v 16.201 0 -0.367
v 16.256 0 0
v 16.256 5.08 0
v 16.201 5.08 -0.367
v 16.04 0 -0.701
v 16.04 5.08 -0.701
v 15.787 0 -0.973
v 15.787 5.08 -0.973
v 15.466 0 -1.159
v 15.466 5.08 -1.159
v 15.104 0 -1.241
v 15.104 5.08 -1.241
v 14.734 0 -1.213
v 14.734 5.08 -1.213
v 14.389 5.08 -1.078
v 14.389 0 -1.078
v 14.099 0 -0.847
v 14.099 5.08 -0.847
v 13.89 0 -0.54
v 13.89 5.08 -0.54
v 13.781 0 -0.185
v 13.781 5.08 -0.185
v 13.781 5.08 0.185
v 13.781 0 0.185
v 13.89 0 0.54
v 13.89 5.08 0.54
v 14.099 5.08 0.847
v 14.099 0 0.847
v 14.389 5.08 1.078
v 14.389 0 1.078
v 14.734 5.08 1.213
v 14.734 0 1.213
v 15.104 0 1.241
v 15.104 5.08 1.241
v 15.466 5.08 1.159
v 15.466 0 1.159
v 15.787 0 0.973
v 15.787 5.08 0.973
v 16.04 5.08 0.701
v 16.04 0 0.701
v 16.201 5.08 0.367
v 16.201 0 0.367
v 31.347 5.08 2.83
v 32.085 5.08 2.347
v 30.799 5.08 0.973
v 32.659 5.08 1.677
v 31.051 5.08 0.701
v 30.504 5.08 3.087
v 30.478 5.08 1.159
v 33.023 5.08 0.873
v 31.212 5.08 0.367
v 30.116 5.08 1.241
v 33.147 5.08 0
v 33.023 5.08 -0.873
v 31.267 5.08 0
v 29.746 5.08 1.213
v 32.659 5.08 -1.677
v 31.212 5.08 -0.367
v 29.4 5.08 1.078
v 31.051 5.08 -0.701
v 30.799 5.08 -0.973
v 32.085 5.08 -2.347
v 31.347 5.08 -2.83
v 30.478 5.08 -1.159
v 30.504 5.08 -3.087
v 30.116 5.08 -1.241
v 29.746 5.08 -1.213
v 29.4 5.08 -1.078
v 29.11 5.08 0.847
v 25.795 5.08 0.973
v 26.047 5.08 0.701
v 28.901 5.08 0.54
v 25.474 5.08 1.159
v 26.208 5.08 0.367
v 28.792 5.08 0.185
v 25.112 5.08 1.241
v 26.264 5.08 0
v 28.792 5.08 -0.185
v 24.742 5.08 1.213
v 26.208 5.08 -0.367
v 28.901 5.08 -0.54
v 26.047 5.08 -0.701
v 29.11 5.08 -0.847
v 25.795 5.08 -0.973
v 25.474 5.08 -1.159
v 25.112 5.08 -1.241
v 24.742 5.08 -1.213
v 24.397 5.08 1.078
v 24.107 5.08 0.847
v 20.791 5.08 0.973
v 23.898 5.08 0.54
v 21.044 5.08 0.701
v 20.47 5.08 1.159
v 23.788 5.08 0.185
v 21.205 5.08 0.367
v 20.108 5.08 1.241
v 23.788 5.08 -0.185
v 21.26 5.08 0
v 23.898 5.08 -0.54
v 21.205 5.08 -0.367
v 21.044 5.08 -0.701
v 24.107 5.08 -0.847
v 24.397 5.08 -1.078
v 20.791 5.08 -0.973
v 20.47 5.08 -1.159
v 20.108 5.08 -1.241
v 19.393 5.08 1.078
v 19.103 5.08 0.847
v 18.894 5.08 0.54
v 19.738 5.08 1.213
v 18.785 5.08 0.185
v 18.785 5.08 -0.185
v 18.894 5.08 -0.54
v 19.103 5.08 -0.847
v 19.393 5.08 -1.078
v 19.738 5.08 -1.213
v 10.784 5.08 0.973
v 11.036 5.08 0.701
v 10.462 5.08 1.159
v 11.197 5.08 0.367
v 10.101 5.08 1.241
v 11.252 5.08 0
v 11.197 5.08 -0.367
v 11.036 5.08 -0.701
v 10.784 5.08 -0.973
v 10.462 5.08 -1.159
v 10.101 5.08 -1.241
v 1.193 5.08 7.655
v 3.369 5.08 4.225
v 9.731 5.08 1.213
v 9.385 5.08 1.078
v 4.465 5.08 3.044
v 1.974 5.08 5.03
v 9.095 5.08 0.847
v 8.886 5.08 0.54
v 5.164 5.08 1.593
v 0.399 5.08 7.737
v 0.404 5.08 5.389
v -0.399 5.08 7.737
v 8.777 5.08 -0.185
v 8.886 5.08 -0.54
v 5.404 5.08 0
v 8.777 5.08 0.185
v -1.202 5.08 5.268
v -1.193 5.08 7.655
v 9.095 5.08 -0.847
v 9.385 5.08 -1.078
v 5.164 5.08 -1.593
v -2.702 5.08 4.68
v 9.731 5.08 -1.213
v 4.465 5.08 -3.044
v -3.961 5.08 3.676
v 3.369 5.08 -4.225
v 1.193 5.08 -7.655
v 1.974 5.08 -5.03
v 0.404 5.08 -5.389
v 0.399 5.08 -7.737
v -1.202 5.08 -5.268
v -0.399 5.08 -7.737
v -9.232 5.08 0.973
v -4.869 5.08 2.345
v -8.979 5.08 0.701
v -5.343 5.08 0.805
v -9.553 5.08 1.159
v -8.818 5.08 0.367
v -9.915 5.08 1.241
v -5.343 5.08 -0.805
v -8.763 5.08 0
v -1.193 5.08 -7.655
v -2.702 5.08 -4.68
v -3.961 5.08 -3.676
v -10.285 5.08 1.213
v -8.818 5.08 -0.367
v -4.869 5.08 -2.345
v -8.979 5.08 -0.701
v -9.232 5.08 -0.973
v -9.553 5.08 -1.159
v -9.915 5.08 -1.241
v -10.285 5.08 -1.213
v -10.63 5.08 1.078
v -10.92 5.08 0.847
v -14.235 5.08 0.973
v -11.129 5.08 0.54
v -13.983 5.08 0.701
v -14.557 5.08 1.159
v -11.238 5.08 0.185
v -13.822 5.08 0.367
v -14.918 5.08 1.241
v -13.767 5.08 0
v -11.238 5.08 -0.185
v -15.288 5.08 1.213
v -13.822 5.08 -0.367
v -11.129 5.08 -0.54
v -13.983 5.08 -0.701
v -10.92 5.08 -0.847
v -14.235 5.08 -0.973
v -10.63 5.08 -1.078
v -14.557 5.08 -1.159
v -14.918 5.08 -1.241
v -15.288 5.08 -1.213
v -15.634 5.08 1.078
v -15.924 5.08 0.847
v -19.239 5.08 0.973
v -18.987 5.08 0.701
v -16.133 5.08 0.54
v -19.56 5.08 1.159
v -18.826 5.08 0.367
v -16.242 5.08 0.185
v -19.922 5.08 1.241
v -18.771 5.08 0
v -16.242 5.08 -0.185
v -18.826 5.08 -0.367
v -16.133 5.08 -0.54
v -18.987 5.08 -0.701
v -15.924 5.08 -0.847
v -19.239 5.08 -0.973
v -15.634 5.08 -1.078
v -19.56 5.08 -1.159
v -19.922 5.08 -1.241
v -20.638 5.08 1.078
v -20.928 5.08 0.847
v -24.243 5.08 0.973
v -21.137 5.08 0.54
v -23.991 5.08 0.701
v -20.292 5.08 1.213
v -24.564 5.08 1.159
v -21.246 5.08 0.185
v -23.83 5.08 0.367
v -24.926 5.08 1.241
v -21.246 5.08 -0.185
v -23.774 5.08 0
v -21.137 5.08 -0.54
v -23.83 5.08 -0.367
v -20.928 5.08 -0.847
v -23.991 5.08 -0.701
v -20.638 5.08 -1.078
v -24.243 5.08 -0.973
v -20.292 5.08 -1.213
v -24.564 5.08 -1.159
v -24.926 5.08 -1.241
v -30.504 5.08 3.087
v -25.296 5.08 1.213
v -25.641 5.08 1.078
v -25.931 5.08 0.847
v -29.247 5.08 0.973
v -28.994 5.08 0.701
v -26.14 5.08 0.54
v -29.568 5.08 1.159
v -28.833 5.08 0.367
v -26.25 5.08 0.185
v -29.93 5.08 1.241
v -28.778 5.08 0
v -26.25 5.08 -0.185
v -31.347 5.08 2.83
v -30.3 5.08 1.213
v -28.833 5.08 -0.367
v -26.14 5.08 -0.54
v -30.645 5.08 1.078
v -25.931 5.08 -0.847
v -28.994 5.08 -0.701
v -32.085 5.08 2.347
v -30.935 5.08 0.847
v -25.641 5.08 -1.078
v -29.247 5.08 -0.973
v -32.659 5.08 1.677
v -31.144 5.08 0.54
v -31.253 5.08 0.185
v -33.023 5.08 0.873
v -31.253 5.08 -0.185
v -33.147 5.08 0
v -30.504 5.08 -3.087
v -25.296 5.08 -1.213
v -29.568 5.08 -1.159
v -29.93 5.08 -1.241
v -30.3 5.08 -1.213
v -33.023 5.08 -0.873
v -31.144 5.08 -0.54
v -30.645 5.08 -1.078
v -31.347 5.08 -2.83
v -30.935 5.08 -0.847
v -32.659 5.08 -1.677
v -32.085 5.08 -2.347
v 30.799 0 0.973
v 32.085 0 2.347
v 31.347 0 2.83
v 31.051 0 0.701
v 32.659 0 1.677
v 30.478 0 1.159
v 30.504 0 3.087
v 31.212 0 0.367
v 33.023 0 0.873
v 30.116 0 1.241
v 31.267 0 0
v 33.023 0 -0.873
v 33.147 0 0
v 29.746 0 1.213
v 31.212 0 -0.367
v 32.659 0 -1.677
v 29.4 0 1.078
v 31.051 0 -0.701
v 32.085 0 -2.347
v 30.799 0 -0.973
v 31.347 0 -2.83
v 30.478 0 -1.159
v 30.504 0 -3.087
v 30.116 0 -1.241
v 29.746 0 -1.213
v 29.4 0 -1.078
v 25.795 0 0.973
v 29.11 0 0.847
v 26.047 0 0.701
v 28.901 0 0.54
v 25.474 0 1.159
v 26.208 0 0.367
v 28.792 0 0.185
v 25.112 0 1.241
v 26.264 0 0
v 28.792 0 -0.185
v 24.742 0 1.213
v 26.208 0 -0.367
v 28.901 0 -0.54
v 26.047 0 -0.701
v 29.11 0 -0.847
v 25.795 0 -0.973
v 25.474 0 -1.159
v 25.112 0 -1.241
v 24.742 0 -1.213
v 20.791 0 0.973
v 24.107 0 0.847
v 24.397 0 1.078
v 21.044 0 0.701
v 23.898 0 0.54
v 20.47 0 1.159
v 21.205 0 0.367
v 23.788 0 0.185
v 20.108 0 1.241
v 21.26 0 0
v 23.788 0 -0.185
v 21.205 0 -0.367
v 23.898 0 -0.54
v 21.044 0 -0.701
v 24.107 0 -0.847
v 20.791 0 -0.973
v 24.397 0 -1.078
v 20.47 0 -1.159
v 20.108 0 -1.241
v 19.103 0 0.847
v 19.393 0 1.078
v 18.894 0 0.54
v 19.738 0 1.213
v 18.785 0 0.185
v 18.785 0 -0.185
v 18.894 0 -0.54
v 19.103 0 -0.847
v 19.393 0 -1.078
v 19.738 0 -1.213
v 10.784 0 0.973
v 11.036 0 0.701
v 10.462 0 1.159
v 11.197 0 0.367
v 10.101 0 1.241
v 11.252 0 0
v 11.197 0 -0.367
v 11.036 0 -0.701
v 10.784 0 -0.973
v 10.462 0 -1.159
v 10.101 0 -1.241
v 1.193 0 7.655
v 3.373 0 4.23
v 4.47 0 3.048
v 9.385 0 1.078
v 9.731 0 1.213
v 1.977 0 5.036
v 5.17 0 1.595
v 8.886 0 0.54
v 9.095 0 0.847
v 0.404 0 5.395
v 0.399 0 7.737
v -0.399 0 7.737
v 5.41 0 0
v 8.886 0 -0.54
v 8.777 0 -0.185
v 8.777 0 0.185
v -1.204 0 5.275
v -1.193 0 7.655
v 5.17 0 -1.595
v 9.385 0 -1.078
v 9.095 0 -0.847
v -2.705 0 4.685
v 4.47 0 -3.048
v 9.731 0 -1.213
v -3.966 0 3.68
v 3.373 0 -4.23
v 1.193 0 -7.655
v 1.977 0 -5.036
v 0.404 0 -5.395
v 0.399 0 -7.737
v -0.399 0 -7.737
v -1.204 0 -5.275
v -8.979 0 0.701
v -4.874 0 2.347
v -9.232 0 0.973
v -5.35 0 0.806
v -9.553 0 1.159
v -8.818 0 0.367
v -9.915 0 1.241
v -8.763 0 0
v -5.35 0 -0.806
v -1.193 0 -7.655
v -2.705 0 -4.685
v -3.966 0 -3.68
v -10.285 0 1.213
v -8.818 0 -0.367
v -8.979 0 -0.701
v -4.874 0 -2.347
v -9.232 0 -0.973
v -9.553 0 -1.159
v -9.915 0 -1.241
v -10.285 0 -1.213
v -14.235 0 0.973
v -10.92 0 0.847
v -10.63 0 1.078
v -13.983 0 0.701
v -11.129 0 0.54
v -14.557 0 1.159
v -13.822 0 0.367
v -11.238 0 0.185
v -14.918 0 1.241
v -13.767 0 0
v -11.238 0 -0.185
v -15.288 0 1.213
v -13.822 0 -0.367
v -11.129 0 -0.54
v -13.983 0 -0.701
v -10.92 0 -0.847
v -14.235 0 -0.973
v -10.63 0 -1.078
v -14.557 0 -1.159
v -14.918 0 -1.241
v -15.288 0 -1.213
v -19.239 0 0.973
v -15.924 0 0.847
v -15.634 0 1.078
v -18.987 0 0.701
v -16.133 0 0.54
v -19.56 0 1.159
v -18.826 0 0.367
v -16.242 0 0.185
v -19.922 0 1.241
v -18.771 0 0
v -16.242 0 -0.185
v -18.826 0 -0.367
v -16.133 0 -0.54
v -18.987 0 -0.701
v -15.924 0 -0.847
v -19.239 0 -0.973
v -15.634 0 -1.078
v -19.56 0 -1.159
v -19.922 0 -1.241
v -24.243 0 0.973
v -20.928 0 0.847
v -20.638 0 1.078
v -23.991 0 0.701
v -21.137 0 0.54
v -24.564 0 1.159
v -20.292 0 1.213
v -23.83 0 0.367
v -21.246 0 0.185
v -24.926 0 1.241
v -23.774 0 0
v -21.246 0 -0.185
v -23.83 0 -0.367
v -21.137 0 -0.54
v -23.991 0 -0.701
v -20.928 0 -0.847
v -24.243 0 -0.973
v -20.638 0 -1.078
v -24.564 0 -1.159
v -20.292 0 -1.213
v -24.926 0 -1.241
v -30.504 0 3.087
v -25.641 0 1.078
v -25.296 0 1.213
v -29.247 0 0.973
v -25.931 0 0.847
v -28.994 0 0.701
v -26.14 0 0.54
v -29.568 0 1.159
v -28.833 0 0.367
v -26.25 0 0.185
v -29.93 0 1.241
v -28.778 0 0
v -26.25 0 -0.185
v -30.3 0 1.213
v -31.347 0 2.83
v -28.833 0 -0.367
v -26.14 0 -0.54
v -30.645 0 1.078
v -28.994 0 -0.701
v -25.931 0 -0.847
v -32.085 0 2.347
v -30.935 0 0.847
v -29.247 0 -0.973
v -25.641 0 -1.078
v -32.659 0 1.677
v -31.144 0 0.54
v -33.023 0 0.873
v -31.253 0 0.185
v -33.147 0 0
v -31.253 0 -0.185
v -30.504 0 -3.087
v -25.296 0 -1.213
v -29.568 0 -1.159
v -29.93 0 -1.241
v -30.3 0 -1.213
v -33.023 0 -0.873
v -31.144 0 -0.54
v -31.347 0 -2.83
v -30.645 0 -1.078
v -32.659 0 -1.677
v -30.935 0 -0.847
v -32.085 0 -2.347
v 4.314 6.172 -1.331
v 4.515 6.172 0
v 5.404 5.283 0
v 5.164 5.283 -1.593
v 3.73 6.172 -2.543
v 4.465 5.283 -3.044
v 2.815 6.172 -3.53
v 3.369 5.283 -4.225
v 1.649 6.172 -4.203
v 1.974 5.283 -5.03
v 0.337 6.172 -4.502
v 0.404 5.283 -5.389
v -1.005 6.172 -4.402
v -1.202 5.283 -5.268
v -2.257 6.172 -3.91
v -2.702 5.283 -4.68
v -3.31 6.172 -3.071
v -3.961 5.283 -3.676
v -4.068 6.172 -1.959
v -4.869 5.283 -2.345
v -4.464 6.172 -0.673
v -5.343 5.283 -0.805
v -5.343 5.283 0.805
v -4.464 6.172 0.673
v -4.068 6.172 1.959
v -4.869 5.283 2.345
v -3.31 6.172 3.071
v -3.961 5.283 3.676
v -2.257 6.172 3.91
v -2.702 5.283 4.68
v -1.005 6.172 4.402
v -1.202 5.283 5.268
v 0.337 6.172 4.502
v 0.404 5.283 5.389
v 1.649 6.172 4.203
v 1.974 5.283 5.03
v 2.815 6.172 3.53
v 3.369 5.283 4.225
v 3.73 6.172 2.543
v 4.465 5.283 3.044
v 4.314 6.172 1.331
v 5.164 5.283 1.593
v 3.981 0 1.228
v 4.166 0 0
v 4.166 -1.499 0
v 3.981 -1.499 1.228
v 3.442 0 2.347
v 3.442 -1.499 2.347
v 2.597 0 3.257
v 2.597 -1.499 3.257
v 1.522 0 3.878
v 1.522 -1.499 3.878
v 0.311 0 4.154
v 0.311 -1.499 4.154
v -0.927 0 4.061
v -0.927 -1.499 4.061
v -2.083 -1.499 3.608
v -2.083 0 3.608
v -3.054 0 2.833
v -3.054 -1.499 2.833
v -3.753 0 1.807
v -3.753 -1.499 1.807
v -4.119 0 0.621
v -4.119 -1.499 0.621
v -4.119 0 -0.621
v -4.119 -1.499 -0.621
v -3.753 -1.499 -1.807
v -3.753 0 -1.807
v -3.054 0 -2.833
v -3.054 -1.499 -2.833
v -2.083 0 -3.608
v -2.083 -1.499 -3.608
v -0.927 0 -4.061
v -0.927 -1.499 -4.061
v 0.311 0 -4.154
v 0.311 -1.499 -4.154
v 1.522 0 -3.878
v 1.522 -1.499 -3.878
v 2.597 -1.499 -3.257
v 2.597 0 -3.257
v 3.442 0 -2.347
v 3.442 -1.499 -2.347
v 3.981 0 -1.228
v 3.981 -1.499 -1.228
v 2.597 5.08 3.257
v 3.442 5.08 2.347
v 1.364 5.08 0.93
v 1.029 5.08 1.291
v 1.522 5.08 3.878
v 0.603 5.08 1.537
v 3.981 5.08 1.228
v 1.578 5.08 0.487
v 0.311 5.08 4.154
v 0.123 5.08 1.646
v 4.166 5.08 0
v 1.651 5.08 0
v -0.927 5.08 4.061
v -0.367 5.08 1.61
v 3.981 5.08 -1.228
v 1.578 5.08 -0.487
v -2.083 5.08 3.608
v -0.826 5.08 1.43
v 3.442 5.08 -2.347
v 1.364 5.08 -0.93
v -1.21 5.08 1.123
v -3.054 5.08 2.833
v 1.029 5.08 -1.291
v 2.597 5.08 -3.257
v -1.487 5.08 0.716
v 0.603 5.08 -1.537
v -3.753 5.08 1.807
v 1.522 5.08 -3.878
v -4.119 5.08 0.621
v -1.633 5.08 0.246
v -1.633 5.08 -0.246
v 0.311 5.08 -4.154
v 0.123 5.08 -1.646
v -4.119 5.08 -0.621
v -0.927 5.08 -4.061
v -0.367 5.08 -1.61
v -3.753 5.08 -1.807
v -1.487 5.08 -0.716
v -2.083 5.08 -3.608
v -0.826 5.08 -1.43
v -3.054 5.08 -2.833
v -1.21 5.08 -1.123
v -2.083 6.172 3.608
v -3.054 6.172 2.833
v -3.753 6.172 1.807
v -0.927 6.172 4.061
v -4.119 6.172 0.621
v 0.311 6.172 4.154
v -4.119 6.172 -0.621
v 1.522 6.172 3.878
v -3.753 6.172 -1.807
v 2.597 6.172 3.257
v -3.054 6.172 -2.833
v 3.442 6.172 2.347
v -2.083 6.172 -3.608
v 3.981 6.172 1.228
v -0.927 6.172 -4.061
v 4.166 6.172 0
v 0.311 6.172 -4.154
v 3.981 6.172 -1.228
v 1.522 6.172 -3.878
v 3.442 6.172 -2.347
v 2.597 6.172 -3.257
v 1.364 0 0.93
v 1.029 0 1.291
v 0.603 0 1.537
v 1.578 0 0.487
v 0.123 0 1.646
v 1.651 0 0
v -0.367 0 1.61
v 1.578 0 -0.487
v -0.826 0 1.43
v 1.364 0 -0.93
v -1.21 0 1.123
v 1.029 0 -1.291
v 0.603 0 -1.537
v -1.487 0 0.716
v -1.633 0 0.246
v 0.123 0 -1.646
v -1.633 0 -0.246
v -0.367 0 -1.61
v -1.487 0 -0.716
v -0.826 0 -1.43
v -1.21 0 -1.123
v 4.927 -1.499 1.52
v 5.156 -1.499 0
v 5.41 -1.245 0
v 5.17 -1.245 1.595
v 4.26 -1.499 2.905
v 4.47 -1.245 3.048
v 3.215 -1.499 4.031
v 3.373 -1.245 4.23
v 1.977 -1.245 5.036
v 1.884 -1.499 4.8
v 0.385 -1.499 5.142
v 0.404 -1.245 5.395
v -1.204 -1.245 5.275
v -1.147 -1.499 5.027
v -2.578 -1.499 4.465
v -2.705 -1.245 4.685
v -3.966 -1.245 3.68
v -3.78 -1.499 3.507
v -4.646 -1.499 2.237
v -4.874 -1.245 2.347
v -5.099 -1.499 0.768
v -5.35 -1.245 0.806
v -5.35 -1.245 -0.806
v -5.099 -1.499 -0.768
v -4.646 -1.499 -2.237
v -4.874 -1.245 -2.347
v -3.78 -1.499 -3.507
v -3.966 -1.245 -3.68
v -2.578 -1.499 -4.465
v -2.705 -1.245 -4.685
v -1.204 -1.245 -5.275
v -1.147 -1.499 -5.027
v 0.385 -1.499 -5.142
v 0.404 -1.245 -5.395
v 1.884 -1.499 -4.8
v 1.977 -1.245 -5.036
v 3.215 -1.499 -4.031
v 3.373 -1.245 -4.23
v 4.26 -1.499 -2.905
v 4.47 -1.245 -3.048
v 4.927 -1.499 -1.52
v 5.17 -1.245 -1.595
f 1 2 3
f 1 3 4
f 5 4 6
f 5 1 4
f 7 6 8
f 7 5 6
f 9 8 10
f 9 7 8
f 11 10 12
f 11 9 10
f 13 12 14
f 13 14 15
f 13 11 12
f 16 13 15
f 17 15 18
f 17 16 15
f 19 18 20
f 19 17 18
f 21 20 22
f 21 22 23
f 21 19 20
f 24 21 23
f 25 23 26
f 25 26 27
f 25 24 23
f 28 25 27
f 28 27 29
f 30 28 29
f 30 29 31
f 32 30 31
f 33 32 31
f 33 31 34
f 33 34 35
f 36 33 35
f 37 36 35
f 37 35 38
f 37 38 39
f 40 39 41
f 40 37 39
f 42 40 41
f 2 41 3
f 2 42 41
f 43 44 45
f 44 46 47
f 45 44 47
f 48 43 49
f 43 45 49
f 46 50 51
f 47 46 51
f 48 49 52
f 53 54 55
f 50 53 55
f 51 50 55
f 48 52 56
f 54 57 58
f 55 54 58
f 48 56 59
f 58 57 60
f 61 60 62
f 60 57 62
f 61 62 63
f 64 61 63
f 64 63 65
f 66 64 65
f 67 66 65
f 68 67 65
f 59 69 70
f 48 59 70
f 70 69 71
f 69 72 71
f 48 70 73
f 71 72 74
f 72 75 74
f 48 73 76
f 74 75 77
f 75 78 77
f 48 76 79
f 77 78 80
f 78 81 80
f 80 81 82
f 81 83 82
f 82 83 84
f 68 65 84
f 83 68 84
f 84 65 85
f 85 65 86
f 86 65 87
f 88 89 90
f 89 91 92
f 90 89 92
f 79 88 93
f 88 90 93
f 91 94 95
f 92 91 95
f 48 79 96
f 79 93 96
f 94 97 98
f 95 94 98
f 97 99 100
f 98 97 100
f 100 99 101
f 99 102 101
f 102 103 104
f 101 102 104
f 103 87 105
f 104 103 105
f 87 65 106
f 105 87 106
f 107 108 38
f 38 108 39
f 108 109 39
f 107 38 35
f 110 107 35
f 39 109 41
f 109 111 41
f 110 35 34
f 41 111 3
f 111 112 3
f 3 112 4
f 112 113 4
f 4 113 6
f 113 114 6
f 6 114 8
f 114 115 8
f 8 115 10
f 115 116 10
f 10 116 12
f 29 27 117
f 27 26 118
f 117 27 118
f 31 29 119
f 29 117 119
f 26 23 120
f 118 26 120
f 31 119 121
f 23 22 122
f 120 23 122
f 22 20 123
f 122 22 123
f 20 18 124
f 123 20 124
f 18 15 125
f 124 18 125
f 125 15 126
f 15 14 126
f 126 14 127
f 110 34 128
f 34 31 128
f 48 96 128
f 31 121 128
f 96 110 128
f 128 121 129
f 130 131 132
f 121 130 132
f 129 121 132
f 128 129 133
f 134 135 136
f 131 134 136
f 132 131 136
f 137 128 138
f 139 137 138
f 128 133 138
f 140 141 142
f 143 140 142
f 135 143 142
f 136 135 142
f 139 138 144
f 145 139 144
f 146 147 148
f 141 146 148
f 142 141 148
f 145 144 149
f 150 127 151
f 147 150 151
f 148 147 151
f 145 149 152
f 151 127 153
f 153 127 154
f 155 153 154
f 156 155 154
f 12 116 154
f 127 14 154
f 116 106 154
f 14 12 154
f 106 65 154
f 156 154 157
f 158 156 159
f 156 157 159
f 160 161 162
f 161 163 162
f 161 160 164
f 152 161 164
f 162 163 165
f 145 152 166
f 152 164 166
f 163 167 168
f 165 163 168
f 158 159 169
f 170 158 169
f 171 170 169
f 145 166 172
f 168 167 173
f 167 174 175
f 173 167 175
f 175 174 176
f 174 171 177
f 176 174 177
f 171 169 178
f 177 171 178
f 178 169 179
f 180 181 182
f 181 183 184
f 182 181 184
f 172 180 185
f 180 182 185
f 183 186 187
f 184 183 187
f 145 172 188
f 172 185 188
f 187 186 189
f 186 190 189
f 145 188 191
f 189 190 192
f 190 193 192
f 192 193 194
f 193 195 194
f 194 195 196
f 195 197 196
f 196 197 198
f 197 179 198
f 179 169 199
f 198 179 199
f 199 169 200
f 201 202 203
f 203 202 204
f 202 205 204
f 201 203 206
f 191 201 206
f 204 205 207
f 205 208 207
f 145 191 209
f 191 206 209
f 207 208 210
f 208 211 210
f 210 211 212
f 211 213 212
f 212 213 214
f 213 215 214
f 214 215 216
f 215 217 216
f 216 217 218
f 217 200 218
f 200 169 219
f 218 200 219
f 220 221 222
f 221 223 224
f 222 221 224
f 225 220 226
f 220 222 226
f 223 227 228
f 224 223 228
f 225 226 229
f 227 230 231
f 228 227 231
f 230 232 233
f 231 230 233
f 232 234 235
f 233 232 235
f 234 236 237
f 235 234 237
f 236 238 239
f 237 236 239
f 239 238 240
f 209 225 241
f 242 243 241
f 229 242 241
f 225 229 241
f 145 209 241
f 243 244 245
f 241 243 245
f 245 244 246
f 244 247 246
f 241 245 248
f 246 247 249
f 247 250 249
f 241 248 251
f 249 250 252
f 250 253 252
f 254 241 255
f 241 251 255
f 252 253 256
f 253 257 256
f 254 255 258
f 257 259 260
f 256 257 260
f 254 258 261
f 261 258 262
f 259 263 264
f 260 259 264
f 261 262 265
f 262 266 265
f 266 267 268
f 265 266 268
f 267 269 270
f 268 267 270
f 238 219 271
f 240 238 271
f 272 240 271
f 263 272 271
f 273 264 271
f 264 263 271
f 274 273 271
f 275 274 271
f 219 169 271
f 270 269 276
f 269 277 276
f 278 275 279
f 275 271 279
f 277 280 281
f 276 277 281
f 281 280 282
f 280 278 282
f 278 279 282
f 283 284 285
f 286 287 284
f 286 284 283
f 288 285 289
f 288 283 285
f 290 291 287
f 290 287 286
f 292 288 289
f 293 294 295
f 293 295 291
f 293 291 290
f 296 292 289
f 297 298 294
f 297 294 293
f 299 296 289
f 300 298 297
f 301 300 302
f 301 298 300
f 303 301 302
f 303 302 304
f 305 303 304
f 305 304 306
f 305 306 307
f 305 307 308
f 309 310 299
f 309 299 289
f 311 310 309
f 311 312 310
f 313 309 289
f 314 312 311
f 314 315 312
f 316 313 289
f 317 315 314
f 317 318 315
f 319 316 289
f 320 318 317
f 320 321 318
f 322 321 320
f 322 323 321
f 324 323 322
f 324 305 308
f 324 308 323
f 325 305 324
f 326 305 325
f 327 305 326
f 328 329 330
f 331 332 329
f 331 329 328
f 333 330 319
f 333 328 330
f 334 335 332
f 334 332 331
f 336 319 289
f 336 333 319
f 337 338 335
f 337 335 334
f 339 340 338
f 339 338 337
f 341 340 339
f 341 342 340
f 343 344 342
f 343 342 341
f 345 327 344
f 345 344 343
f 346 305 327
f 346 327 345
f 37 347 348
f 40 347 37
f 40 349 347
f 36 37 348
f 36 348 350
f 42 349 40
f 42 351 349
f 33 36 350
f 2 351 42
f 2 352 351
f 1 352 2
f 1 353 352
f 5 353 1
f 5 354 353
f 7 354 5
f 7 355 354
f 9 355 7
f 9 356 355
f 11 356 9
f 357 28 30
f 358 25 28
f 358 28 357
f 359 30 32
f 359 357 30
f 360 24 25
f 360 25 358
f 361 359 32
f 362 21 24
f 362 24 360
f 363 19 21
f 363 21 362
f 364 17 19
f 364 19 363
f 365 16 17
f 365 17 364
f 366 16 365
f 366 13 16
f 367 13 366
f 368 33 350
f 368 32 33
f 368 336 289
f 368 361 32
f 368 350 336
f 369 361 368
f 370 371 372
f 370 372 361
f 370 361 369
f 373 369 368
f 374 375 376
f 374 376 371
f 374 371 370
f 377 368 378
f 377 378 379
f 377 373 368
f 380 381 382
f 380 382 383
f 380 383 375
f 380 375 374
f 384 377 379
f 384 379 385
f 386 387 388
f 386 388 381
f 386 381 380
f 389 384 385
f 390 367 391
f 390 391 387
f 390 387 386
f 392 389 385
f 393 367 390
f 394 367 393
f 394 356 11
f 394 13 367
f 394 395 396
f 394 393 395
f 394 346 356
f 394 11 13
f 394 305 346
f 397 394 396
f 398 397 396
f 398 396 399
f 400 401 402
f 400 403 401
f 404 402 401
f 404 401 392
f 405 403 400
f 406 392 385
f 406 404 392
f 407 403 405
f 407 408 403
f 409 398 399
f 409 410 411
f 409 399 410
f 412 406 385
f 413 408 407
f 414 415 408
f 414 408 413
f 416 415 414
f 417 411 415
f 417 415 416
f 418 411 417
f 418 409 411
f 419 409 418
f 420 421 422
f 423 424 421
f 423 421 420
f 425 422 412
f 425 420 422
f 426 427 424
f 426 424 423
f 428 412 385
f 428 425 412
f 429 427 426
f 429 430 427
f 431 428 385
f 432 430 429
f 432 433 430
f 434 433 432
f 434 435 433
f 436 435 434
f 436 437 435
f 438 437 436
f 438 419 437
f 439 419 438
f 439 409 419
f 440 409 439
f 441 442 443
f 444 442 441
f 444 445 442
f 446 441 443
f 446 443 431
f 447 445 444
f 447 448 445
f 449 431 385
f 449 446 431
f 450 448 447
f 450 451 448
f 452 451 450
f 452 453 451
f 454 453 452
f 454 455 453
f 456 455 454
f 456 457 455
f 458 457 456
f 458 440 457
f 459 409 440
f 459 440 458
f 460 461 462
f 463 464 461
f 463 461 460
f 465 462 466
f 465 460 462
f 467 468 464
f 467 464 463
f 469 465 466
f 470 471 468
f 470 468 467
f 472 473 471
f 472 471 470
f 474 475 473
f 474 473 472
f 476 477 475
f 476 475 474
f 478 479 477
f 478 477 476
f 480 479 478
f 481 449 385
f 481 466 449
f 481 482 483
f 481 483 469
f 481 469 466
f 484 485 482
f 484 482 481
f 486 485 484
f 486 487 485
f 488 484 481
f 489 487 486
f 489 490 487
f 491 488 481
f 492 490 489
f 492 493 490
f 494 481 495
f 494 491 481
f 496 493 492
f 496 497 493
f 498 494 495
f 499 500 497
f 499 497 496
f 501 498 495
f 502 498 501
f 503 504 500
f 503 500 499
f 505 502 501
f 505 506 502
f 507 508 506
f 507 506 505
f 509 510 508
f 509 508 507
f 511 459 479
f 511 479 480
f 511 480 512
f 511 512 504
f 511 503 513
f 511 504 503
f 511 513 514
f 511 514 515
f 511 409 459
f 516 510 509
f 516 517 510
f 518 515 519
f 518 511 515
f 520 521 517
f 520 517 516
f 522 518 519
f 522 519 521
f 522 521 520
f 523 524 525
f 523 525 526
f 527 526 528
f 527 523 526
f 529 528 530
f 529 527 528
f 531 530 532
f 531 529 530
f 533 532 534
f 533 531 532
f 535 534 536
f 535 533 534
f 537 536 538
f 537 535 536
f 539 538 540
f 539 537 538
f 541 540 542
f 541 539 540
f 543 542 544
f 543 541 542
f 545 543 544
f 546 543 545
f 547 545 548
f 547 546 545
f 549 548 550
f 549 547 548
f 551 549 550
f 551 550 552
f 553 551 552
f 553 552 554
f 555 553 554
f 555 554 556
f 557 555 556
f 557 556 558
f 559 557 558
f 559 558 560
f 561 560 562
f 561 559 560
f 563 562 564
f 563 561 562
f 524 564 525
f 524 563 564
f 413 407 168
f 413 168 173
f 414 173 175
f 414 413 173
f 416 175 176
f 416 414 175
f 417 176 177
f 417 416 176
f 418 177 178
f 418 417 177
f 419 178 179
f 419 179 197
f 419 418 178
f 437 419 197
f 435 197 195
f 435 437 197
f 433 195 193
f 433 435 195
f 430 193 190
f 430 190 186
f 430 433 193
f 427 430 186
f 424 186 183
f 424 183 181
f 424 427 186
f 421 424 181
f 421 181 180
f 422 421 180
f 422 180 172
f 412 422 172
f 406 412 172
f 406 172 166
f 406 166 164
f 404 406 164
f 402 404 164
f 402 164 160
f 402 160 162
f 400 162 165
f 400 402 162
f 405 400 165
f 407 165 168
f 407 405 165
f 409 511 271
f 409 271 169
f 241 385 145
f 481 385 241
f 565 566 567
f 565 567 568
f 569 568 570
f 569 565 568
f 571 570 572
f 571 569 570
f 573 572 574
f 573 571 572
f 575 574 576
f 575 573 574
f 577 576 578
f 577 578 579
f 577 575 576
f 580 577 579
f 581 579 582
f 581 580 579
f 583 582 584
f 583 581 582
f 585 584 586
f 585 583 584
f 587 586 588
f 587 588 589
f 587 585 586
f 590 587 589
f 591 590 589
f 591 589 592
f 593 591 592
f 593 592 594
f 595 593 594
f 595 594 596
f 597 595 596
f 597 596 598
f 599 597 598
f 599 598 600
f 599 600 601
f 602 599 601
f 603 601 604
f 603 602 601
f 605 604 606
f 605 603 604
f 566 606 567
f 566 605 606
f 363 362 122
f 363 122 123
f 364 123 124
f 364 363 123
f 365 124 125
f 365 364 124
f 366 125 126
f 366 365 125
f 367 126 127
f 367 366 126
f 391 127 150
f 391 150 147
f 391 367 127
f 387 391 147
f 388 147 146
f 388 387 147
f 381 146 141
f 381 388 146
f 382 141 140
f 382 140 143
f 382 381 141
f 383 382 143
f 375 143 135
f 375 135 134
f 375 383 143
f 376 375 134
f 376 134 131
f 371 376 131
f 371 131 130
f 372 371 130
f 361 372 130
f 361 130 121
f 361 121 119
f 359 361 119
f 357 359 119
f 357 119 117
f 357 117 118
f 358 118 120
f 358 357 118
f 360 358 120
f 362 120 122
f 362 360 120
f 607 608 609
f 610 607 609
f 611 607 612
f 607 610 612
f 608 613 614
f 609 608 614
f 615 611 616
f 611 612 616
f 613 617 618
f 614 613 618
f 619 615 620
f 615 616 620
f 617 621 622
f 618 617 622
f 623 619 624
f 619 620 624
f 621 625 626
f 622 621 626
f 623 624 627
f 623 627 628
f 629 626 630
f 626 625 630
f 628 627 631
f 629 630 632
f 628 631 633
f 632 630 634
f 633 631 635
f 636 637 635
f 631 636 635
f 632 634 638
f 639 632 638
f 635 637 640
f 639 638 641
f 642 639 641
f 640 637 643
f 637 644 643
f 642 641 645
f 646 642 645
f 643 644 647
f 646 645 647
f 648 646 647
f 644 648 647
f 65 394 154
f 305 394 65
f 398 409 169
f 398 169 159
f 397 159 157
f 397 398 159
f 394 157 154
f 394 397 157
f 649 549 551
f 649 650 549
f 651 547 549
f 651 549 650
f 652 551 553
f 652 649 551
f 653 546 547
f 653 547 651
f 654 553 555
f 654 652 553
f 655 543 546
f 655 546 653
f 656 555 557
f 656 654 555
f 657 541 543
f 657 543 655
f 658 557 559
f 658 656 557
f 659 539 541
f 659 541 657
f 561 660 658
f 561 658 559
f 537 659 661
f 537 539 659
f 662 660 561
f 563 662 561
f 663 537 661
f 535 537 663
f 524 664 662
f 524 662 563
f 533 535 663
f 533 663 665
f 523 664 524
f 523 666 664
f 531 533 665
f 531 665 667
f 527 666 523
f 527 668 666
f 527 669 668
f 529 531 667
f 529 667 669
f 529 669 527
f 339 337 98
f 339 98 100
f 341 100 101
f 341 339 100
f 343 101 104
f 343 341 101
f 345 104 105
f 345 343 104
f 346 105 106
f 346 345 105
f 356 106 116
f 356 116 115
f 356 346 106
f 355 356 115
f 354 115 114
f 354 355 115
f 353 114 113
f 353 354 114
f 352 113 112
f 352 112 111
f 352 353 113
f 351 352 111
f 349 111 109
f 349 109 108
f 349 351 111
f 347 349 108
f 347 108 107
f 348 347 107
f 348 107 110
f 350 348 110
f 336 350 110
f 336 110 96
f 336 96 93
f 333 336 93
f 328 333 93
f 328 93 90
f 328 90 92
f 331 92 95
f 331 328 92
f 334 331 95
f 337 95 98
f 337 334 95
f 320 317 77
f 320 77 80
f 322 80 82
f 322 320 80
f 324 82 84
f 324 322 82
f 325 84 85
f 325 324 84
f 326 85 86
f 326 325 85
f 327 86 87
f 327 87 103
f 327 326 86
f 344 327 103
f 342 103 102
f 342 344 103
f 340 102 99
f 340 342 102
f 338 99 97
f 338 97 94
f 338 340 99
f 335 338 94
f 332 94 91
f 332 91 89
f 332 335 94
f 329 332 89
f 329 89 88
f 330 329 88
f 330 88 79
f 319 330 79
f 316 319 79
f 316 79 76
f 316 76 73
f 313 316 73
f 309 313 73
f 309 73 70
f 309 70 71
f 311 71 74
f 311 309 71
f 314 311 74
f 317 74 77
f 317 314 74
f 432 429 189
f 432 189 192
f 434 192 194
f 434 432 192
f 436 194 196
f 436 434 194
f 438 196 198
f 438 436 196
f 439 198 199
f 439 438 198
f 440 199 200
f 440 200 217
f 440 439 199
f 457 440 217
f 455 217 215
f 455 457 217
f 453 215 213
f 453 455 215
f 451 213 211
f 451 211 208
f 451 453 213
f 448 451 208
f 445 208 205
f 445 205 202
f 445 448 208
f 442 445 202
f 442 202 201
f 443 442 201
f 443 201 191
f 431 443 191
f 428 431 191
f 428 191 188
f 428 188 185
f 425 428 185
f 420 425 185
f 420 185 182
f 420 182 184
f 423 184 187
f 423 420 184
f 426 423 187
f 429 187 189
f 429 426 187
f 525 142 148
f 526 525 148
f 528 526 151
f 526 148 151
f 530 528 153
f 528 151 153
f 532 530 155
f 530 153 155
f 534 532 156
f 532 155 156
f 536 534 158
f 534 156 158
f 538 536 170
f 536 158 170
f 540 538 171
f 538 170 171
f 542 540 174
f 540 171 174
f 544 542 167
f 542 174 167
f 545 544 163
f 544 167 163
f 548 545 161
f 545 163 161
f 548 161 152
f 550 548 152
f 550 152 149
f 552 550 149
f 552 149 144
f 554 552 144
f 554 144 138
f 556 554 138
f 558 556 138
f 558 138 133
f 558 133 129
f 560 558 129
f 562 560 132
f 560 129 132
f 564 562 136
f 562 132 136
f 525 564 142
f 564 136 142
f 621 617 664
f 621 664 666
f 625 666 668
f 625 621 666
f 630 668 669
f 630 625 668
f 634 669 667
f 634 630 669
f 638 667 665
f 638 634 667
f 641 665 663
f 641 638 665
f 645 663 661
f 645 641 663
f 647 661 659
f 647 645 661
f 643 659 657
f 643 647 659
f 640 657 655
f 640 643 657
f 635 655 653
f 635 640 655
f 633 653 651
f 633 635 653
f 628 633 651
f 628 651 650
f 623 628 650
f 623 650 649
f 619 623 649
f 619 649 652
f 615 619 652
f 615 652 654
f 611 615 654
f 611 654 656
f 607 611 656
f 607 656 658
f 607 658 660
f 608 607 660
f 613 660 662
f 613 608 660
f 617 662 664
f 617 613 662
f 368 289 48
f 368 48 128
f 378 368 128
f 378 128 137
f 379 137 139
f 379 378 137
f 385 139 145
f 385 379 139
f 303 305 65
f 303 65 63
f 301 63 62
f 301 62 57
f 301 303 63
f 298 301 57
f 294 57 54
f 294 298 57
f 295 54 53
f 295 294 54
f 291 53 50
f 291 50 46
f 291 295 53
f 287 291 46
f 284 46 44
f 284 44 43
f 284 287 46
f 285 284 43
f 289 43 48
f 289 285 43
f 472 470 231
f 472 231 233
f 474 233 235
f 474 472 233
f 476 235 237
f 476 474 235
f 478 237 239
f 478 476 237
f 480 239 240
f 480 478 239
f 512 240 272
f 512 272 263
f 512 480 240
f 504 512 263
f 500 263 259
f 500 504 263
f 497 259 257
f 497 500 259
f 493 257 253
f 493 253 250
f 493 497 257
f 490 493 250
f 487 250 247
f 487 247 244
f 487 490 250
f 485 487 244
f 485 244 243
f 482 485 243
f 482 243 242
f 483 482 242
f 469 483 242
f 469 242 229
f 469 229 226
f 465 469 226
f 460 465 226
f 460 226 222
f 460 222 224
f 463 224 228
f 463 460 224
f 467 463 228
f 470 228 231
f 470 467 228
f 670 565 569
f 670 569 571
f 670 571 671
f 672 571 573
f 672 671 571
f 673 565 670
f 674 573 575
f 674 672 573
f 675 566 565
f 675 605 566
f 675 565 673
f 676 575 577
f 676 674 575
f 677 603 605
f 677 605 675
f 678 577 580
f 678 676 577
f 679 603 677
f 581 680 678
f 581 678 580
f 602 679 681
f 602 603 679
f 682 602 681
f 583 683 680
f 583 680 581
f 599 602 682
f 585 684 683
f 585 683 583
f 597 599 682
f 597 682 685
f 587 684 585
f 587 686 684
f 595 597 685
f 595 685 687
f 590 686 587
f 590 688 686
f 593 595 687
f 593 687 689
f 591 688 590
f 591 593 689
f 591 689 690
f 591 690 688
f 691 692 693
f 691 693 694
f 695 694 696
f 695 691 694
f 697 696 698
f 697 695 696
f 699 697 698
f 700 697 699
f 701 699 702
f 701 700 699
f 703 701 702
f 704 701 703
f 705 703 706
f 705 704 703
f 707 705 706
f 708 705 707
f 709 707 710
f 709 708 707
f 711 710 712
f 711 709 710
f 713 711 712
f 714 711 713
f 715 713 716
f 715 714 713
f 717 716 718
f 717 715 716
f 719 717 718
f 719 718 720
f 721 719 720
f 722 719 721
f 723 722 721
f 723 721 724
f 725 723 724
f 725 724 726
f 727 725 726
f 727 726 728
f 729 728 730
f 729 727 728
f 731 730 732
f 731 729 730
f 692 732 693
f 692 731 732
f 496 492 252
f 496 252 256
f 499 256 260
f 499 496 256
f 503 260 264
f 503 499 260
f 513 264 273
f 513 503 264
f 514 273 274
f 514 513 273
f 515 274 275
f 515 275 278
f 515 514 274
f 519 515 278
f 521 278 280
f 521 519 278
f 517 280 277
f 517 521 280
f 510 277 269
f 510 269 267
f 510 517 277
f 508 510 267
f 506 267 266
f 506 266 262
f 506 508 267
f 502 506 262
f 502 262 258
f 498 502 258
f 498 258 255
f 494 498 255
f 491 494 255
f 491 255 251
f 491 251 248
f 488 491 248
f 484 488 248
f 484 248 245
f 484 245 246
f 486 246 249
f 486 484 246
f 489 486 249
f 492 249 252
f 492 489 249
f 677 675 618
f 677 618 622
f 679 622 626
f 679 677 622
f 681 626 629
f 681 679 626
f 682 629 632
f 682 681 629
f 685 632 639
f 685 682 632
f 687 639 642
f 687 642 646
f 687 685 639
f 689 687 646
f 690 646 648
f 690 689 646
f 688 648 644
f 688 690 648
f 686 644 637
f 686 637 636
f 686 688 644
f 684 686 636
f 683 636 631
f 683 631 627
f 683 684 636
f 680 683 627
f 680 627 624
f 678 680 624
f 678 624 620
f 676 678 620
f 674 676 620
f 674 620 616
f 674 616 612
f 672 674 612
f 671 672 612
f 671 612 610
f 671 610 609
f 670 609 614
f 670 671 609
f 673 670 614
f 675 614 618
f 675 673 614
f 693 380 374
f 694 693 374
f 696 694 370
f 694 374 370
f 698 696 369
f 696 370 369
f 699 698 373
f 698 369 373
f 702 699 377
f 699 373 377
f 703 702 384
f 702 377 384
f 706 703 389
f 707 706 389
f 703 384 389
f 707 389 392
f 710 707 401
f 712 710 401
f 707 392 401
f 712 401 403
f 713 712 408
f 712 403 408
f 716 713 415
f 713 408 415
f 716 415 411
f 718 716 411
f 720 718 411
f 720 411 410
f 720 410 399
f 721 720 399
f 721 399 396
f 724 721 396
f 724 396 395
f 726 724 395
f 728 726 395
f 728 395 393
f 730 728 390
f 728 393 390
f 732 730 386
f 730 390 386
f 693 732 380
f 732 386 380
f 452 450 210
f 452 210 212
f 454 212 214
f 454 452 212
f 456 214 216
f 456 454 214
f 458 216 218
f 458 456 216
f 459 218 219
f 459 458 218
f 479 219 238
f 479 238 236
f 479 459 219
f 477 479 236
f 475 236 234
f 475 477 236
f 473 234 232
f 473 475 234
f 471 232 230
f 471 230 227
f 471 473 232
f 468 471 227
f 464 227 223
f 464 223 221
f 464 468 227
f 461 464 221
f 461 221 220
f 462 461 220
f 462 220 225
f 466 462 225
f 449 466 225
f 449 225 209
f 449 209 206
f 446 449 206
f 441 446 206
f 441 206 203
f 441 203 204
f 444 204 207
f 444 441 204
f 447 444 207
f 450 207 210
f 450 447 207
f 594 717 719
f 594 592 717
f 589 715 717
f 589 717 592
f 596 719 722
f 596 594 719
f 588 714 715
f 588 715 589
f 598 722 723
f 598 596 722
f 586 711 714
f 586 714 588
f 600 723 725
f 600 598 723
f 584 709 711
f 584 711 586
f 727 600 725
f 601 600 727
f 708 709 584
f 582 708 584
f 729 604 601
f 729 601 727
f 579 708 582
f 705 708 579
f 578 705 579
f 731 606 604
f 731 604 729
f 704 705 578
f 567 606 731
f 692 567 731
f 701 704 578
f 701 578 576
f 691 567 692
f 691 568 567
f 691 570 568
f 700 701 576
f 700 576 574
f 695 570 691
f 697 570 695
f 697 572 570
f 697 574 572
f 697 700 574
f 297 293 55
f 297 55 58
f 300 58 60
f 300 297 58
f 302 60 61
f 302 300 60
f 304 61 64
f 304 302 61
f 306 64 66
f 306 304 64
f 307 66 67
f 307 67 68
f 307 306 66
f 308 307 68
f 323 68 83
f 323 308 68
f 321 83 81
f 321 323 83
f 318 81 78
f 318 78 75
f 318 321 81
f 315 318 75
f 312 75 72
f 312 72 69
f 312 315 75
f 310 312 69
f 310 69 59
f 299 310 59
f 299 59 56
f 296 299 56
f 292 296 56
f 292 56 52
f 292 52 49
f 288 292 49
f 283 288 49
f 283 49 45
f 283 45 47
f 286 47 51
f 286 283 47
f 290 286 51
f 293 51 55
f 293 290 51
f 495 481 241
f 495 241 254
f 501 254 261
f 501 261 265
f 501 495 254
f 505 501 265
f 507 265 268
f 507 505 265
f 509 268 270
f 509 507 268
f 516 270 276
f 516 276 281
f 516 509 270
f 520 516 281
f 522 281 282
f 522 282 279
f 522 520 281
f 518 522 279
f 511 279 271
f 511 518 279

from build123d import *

# Parameters (mm, degrees)
SKETCH1_R           = 1.651
SKETCH1_R_2         = 1.2446
BOSS_EXTRUDE1_DEPTH = 5.08
SKETCH2_R           = 5.40385
SKETCH2_R_2         = 4.1656
BOSS_EXTRUDE2_DEPTH = 1.0922
CHAMFER1_SIZE       = 0.889
SKETCH4_R           = 5.4102
SKETCH4_R_2         = 4.1656
BOSS_EXTRUDE3_DEPTH = 1.4986
CHAMFER2_SIZE       = 0.254


with BuildPart() as part:
    # Sketch1 → Boss-Extrude1 (new body)
    with BuildSketch(Plane(origin=(0, 0, 0), x_dir=(1, 0, 0), z_dir=(0, 1, 0))):
        with BuildLine():
            Line((-30.503852792, 3.086942476), (-1.192854484, 7.654613457))
            ThreePointArc((-1.192854484, 7.654613457), (0, 7.747), (1.192854484, 7.654613457))
            Line((1.192854484, 7.654613457), (30.503852792, 3.086942476))
            ThreePointArc((30.503852792, 3.086942476), (33.147, 0), (30.503852792, -3.086942476))
            Line((30.503852792, -3.086942476), (1.192854484, -7.654613457))
            ThreePointArc((1.192854484, -7.654613457), (0, -7.747), (-1.192854484, -7.654613457))
            Line((-1.192854484, -7.654613457), (-30.503852792, -3.086942476))
            ThreePointArc((-30.503852792, -3.086942476), (-33.147, 0), (-30.503852792, 3.086942476))
        make_face()
        Circle(SKETCH1_R, mode=Mode.SUBTRACT)
        with Locations((-10.0076, 0)):
            Circle(SKETCH1_R_2, mode=Mode.SUBTRACT)
        with Locations((-15.0114, 0)):
            Circle(SKETCH1_R_2, mode=Mode.SUBTRACT)
        with Locations((-20.0152, 0)):
            Circle(SKETCH1_R_2, mode=Mode.SUBTRACT)
        with Locations((-25.019, 0)):
            Circle(SKETCH1_R_2, mode=Mode.SUBTRACT)
        with Locations((-30.0228, 0)):
            Circle(SKETCH1_R_2, mode=Mode.SUBTRACT)
        with Locations((30.0228, 0)):
            Circle(SKETCH1_R_2, mode=Mode.SUBTRACT)
        with Locations((25.019, 0)):
            Circle(SKETCH1_R_2, mode=Mode.SUBTRACT)
        with Locations((20.0152, 0)):
            Circle(SKETCH1_R_2, mode=Mode.SUBTRACT)
        with Locations((15.0114, 0)):
            Circle(SKETCH1_R_2, mode=Mode.SUBTRACT)
        with Locations((10.0076, 0)):
            Circle(SKETCH1_R_2, mode=Mode.SUBTRACT)
    extrude(amount=BOSS_EXTRUDE1_DEPTH)

    # Sketch2 → Boss-Extrude2 (add)
    with BuildSketch(Plane(origin=(0, 5.08, 0), x_dir=(1, 0, 0), z_dir=(0, 1, 0))):
        Circle(SKETCH2_R)
        Circle(SKETCH2_R_2, mode=Mode.SUBTRACT)
    extrude(amount=BOSS_EXTRUDE2_DEPTH)

    # Chamfer1
    chamfer1_edges = [part.edges().sort_by_distance(p)[0] for p in [
        (-5.40385, 6.1722, 0),
    ]]
    chamfer(chamfer1_edges, length=CHAMFER1_SIZE)

    # Sketch4 → Boss-Extrude3 (add)
    with BuildSketch(Plane.XZ):
        Circle(SKETCH4_R)
        Circle(SKETCH4_R_2, mode=Mode.SUBTRACT)
    extrude(amount=BOSS_EXTRUDE3_DEPTH)

    # Chamfer2
    chamfer2_edges = [part.edges().sort_by_distance(p)[0] for p in [
        (-5.4102, -1.4986, 0),
    ]]
    chamfer(chamfer2_edges, length=CHAMFER2_SIZE)


solid = part.part
